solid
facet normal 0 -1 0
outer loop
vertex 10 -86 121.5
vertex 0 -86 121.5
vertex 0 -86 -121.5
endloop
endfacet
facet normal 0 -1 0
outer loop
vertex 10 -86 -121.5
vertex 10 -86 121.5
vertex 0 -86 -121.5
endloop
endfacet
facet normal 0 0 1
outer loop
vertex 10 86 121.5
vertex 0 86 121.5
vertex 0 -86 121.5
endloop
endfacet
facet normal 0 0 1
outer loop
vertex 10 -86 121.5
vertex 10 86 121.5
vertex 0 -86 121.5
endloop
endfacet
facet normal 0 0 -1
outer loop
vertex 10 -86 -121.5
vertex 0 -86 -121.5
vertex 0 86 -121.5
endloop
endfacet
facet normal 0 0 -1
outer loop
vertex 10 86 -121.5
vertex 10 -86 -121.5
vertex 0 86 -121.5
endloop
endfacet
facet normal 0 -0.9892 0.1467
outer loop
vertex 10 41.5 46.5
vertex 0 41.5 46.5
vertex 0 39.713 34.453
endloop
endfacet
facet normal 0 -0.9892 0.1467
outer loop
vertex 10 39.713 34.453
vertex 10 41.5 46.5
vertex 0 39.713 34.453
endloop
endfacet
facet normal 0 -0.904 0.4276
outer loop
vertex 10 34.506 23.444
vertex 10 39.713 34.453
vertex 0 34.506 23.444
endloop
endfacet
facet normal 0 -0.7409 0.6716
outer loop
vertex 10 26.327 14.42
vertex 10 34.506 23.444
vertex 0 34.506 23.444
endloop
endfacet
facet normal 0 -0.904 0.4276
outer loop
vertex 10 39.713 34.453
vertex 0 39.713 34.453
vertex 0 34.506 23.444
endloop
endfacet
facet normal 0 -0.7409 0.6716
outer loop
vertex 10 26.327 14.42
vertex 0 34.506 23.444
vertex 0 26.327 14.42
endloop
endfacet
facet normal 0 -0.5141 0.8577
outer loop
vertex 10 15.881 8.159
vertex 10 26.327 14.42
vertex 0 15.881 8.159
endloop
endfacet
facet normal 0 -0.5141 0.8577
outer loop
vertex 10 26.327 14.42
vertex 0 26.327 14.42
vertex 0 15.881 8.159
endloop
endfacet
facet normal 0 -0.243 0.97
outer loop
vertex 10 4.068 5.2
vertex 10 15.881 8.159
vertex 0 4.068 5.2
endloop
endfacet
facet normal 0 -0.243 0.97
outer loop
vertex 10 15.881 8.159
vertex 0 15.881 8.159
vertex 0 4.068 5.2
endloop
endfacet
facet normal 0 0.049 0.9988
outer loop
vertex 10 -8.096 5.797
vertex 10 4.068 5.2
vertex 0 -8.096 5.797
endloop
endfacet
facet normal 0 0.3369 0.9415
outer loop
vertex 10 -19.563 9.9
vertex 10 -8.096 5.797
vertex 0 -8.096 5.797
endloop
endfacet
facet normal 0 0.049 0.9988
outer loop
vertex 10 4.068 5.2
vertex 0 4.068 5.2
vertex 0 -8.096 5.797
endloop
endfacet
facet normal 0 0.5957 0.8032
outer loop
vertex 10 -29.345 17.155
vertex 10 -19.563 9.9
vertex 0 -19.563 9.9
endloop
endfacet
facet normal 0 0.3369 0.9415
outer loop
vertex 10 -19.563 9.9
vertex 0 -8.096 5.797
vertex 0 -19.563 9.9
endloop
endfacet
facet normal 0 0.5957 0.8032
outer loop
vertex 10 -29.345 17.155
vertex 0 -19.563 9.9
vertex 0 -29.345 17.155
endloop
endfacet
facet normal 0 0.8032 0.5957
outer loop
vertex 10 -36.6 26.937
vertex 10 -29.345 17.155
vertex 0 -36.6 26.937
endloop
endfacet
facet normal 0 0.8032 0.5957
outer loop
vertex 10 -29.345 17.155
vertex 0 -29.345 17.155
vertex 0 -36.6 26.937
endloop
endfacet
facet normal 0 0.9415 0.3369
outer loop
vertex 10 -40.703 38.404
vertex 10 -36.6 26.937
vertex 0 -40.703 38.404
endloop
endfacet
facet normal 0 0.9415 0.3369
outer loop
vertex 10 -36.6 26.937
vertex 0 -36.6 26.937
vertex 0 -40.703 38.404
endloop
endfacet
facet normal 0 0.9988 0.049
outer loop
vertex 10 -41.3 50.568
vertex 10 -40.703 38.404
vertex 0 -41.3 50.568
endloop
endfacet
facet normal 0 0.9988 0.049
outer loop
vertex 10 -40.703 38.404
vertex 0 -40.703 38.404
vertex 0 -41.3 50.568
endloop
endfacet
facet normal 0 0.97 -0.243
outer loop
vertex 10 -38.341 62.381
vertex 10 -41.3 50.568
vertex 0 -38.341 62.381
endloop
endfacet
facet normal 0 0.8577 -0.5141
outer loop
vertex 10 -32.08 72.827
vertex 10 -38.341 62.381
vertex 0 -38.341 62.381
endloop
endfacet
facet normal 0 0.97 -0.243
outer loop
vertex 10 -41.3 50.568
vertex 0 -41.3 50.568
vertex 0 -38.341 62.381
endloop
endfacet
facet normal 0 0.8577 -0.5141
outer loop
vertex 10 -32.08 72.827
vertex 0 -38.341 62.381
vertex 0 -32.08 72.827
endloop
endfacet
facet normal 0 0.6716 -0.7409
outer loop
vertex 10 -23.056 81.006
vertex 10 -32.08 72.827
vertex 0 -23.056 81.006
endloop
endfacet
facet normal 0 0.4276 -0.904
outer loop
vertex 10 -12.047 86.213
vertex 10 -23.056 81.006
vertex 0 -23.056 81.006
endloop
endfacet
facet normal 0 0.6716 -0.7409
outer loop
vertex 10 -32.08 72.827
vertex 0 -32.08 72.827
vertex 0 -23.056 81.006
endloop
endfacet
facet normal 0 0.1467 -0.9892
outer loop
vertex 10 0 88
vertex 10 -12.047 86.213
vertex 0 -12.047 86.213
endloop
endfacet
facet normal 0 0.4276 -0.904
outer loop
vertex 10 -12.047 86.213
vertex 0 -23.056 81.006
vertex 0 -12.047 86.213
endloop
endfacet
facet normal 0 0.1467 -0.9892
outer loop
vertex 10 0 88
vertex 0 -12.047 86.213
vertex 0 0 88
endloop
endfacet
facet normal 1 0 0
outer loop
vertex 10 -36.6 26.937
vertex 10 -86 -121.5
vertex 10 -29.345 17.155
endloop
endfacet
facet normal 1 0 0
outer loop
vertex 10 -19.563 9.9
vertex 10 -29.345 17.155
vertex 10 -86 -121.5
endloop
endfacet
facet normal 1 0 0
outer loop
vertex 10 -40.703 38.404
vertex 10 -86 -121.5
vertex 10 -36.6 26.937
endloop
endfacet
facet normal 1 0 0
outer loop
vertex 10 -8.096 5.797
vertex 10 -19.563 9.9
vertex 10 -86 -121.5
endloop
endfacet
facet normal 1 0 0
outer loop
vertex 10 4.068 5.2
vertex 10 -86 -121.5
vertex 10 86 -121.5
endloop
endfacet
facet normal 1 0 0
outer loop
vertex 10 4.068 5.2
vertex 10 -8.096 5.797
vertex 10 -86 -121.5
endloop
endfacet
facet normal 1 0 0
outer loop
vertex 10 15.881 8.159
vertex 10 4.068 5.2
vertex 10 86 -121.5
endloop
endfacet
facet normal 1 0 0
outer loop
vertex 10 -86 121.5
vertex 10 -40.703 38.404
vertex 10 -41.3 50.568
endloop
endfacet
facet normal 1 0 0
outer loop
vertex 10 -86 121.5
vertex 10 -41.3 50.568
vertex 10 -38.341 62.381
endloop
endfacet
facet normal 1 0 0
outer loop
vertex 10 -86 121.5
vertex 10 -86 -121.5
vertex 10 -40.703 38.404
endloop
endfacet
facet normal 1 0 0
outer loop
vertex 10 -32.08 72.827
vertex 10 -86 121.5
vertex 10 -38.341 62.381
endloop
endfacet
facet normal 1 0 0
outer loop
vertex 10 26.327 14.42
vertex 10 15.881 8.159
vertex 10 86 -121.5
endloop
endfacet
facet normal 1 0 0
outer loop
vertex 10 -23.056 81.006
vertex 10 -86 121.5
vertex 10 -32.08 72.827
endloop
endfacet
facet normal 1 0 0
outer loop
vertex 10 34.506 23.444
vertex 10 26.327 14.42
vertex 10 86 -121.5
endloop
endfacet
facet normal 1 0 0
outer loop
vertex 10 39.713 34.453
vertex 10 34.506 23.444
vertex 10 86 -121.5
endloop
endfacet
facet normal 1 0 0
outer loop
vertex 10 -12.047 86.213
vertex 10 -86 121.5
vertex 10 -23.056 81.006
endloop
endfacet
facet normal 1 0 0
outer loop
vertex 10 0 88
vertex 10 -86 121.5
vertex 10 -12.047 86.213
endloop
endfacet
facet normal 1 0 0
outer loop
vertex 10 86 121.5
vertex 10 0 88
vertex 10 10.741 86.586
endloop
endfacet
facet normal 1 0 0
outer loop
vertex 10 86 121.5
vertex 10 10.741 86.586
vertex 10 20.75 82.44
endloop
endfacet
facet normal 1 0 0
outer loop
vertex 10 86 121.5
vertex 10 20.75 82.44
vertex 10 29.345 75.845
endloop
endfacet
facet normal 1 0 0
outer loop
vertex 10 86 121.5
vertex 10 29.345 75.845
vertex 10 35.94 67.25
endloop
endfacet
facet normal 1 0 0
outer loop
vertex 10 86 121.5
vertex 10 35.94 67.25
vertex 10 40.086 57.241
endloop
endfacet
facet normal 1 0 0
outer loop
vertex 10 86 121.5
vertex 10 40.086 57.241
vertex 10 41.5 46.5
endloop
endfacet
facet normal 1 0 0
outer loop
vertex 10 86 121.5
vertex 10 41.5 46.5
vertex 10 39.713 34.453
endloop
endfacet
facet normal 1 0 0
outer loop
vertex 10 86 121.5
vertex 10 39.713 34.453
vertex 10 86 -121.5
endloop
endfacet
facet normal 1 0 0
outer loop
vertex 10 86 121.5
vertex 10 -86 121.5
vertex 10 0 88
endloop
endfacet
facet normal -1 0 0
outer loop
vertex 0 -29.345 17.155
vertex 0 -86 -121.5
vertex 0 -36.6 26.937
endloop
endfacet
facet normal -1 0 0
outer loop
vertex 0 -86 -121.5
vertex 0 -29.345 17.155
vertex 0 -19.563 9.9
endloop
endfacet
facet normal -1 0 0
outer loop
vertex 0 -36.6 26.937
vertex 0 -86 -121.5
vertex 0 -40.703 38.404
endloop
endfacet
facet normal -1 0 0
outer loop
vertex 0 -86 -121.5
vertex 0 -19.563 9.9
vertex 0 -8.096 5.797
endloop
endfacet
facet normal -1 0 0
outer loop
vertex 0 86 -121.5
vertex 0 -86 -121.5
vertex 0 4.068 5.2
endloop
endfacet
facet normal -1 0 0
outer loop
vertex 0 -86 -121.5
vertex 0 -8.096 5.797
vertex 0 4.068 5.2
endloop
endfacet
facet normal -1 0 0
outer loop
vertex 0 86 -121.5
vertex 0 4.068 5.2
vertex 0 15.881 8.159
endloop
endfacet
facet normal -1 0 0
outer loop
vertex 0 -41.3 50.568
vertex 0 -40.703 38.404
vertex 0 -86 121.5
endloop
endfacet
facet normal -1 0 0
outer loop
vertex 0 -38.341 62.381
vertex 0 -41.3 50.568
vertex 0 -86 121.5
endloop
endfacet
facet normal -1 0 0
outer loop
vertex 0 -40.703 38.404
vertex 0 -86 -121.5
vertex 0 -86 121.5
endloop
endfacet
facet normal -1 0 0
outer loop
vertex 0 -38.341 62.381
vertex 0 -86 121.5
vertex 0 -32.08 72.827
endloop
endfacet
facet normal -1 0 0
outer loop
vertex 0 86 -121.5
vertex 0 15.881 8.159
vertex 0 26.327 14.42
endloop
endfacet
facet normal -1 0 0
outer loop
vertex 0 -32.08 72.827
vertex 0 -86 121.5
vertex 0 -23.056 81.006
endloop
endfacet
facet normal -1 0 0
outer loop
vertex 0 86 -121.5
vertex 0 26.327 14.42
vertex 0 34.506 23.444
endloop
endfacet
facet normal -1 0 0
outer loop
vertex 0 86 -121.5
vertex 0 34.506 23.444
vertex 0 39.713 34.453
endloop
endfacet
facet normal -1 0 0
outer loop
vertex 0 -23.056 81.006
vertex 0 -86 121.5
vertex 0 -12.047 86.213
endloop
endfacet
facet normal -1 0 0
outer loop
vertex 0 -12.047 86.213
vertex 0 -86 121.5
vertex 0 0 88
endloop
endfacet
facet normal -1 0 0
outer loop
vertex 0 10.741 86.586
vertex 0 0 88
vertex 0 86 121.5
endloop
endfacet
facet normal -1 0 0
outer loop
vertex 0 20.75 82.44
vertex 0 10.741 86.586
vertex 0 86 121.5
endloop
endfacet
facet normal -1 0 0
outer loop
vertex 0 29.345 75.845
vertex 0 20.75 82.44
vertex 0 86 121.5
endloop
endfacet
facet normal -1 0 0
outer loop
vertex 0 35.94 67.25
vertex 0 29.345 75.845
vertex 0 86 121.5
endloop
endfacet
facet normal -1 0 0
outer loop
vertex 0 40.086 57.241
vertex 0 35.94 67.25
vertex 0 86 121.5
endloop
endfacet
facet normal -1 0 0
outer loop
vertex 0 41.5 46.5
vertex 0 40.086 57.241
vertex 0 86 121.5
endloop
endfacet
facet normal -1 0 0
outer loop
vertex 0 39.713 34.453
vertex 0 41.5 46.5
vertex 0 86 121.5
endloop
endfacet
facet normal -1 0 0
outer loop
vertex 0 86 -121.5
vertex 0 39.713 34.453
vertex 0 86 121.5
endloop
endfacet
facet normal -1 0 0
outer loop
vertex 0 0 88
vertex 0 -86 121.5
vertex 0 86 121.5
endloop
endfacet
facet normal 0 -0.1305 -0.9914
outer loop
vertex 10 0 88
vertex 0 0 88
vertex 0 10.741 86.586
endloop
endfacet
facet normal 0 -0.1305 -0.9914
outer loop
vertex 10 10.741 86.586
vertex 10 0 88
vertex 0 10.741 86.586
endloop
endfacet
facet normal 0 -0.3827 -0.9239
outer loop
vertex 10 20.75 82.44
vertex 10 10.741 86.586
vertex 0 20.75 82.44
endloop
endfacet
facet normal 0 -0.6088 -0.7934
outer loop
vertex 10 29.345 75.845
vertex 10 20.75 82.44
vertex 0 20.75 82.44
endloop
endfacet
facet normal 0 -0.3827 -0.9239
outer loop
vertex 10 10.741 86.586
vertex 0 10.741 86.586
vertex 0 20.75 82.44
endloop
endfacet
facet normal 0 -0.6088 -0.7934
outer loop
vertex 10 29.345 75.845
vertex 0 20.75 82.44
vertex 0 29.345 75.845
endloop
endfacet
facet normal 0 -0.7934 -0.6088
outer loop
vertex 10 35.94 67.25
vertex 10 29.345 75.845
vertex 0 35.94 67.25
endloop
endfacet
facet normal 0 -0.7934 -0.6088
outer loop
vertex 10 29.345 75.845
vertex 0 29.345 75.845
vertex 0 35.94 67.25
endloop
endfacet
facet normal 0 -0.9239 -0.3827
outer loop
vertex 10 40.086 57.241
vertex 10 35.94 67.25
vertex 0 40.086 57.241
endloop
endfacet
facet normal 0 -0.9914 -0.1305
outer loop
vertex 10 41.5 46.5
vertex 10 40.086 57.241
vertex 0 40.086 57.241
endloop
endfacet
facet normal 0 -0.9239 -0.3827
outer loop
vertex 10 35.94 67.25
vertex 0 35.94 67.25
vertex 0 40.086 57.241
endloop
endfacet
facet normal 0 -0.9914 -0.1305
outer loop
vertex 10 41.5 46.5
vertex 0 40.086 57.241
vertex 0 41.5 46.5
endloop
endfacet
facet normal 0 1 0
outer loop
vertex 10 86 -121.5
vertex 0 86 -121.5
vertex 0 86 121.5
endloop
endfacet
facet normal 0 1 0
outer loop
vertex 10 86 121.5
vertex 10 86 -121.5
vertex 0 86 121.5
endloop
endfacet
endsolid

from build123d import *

# Parameters (mm, degrees)
F1_DEPTH = 10


with BuildPart() as f1:
    # F0 (on Right) → F1 (new body)
    with BuildSketch(Plane.YZ):
        Polygon((86, -121.5), (86, 121.5), (0, 121.5), (-86, 121.5), (-86, -121.5), align=None)
        with BuildLine():
            ThreePointArc((41.5, 46.5), (-29.344931, 17.155069), (0, 88))
            ThreePointArc((0, 88), (29.344931, 75.844931), (41.5, 46.5))
        make_face(mode=Mode.SUBTRACT)
    extrude(amount=F1_DEPTH)


solid = f1.part
